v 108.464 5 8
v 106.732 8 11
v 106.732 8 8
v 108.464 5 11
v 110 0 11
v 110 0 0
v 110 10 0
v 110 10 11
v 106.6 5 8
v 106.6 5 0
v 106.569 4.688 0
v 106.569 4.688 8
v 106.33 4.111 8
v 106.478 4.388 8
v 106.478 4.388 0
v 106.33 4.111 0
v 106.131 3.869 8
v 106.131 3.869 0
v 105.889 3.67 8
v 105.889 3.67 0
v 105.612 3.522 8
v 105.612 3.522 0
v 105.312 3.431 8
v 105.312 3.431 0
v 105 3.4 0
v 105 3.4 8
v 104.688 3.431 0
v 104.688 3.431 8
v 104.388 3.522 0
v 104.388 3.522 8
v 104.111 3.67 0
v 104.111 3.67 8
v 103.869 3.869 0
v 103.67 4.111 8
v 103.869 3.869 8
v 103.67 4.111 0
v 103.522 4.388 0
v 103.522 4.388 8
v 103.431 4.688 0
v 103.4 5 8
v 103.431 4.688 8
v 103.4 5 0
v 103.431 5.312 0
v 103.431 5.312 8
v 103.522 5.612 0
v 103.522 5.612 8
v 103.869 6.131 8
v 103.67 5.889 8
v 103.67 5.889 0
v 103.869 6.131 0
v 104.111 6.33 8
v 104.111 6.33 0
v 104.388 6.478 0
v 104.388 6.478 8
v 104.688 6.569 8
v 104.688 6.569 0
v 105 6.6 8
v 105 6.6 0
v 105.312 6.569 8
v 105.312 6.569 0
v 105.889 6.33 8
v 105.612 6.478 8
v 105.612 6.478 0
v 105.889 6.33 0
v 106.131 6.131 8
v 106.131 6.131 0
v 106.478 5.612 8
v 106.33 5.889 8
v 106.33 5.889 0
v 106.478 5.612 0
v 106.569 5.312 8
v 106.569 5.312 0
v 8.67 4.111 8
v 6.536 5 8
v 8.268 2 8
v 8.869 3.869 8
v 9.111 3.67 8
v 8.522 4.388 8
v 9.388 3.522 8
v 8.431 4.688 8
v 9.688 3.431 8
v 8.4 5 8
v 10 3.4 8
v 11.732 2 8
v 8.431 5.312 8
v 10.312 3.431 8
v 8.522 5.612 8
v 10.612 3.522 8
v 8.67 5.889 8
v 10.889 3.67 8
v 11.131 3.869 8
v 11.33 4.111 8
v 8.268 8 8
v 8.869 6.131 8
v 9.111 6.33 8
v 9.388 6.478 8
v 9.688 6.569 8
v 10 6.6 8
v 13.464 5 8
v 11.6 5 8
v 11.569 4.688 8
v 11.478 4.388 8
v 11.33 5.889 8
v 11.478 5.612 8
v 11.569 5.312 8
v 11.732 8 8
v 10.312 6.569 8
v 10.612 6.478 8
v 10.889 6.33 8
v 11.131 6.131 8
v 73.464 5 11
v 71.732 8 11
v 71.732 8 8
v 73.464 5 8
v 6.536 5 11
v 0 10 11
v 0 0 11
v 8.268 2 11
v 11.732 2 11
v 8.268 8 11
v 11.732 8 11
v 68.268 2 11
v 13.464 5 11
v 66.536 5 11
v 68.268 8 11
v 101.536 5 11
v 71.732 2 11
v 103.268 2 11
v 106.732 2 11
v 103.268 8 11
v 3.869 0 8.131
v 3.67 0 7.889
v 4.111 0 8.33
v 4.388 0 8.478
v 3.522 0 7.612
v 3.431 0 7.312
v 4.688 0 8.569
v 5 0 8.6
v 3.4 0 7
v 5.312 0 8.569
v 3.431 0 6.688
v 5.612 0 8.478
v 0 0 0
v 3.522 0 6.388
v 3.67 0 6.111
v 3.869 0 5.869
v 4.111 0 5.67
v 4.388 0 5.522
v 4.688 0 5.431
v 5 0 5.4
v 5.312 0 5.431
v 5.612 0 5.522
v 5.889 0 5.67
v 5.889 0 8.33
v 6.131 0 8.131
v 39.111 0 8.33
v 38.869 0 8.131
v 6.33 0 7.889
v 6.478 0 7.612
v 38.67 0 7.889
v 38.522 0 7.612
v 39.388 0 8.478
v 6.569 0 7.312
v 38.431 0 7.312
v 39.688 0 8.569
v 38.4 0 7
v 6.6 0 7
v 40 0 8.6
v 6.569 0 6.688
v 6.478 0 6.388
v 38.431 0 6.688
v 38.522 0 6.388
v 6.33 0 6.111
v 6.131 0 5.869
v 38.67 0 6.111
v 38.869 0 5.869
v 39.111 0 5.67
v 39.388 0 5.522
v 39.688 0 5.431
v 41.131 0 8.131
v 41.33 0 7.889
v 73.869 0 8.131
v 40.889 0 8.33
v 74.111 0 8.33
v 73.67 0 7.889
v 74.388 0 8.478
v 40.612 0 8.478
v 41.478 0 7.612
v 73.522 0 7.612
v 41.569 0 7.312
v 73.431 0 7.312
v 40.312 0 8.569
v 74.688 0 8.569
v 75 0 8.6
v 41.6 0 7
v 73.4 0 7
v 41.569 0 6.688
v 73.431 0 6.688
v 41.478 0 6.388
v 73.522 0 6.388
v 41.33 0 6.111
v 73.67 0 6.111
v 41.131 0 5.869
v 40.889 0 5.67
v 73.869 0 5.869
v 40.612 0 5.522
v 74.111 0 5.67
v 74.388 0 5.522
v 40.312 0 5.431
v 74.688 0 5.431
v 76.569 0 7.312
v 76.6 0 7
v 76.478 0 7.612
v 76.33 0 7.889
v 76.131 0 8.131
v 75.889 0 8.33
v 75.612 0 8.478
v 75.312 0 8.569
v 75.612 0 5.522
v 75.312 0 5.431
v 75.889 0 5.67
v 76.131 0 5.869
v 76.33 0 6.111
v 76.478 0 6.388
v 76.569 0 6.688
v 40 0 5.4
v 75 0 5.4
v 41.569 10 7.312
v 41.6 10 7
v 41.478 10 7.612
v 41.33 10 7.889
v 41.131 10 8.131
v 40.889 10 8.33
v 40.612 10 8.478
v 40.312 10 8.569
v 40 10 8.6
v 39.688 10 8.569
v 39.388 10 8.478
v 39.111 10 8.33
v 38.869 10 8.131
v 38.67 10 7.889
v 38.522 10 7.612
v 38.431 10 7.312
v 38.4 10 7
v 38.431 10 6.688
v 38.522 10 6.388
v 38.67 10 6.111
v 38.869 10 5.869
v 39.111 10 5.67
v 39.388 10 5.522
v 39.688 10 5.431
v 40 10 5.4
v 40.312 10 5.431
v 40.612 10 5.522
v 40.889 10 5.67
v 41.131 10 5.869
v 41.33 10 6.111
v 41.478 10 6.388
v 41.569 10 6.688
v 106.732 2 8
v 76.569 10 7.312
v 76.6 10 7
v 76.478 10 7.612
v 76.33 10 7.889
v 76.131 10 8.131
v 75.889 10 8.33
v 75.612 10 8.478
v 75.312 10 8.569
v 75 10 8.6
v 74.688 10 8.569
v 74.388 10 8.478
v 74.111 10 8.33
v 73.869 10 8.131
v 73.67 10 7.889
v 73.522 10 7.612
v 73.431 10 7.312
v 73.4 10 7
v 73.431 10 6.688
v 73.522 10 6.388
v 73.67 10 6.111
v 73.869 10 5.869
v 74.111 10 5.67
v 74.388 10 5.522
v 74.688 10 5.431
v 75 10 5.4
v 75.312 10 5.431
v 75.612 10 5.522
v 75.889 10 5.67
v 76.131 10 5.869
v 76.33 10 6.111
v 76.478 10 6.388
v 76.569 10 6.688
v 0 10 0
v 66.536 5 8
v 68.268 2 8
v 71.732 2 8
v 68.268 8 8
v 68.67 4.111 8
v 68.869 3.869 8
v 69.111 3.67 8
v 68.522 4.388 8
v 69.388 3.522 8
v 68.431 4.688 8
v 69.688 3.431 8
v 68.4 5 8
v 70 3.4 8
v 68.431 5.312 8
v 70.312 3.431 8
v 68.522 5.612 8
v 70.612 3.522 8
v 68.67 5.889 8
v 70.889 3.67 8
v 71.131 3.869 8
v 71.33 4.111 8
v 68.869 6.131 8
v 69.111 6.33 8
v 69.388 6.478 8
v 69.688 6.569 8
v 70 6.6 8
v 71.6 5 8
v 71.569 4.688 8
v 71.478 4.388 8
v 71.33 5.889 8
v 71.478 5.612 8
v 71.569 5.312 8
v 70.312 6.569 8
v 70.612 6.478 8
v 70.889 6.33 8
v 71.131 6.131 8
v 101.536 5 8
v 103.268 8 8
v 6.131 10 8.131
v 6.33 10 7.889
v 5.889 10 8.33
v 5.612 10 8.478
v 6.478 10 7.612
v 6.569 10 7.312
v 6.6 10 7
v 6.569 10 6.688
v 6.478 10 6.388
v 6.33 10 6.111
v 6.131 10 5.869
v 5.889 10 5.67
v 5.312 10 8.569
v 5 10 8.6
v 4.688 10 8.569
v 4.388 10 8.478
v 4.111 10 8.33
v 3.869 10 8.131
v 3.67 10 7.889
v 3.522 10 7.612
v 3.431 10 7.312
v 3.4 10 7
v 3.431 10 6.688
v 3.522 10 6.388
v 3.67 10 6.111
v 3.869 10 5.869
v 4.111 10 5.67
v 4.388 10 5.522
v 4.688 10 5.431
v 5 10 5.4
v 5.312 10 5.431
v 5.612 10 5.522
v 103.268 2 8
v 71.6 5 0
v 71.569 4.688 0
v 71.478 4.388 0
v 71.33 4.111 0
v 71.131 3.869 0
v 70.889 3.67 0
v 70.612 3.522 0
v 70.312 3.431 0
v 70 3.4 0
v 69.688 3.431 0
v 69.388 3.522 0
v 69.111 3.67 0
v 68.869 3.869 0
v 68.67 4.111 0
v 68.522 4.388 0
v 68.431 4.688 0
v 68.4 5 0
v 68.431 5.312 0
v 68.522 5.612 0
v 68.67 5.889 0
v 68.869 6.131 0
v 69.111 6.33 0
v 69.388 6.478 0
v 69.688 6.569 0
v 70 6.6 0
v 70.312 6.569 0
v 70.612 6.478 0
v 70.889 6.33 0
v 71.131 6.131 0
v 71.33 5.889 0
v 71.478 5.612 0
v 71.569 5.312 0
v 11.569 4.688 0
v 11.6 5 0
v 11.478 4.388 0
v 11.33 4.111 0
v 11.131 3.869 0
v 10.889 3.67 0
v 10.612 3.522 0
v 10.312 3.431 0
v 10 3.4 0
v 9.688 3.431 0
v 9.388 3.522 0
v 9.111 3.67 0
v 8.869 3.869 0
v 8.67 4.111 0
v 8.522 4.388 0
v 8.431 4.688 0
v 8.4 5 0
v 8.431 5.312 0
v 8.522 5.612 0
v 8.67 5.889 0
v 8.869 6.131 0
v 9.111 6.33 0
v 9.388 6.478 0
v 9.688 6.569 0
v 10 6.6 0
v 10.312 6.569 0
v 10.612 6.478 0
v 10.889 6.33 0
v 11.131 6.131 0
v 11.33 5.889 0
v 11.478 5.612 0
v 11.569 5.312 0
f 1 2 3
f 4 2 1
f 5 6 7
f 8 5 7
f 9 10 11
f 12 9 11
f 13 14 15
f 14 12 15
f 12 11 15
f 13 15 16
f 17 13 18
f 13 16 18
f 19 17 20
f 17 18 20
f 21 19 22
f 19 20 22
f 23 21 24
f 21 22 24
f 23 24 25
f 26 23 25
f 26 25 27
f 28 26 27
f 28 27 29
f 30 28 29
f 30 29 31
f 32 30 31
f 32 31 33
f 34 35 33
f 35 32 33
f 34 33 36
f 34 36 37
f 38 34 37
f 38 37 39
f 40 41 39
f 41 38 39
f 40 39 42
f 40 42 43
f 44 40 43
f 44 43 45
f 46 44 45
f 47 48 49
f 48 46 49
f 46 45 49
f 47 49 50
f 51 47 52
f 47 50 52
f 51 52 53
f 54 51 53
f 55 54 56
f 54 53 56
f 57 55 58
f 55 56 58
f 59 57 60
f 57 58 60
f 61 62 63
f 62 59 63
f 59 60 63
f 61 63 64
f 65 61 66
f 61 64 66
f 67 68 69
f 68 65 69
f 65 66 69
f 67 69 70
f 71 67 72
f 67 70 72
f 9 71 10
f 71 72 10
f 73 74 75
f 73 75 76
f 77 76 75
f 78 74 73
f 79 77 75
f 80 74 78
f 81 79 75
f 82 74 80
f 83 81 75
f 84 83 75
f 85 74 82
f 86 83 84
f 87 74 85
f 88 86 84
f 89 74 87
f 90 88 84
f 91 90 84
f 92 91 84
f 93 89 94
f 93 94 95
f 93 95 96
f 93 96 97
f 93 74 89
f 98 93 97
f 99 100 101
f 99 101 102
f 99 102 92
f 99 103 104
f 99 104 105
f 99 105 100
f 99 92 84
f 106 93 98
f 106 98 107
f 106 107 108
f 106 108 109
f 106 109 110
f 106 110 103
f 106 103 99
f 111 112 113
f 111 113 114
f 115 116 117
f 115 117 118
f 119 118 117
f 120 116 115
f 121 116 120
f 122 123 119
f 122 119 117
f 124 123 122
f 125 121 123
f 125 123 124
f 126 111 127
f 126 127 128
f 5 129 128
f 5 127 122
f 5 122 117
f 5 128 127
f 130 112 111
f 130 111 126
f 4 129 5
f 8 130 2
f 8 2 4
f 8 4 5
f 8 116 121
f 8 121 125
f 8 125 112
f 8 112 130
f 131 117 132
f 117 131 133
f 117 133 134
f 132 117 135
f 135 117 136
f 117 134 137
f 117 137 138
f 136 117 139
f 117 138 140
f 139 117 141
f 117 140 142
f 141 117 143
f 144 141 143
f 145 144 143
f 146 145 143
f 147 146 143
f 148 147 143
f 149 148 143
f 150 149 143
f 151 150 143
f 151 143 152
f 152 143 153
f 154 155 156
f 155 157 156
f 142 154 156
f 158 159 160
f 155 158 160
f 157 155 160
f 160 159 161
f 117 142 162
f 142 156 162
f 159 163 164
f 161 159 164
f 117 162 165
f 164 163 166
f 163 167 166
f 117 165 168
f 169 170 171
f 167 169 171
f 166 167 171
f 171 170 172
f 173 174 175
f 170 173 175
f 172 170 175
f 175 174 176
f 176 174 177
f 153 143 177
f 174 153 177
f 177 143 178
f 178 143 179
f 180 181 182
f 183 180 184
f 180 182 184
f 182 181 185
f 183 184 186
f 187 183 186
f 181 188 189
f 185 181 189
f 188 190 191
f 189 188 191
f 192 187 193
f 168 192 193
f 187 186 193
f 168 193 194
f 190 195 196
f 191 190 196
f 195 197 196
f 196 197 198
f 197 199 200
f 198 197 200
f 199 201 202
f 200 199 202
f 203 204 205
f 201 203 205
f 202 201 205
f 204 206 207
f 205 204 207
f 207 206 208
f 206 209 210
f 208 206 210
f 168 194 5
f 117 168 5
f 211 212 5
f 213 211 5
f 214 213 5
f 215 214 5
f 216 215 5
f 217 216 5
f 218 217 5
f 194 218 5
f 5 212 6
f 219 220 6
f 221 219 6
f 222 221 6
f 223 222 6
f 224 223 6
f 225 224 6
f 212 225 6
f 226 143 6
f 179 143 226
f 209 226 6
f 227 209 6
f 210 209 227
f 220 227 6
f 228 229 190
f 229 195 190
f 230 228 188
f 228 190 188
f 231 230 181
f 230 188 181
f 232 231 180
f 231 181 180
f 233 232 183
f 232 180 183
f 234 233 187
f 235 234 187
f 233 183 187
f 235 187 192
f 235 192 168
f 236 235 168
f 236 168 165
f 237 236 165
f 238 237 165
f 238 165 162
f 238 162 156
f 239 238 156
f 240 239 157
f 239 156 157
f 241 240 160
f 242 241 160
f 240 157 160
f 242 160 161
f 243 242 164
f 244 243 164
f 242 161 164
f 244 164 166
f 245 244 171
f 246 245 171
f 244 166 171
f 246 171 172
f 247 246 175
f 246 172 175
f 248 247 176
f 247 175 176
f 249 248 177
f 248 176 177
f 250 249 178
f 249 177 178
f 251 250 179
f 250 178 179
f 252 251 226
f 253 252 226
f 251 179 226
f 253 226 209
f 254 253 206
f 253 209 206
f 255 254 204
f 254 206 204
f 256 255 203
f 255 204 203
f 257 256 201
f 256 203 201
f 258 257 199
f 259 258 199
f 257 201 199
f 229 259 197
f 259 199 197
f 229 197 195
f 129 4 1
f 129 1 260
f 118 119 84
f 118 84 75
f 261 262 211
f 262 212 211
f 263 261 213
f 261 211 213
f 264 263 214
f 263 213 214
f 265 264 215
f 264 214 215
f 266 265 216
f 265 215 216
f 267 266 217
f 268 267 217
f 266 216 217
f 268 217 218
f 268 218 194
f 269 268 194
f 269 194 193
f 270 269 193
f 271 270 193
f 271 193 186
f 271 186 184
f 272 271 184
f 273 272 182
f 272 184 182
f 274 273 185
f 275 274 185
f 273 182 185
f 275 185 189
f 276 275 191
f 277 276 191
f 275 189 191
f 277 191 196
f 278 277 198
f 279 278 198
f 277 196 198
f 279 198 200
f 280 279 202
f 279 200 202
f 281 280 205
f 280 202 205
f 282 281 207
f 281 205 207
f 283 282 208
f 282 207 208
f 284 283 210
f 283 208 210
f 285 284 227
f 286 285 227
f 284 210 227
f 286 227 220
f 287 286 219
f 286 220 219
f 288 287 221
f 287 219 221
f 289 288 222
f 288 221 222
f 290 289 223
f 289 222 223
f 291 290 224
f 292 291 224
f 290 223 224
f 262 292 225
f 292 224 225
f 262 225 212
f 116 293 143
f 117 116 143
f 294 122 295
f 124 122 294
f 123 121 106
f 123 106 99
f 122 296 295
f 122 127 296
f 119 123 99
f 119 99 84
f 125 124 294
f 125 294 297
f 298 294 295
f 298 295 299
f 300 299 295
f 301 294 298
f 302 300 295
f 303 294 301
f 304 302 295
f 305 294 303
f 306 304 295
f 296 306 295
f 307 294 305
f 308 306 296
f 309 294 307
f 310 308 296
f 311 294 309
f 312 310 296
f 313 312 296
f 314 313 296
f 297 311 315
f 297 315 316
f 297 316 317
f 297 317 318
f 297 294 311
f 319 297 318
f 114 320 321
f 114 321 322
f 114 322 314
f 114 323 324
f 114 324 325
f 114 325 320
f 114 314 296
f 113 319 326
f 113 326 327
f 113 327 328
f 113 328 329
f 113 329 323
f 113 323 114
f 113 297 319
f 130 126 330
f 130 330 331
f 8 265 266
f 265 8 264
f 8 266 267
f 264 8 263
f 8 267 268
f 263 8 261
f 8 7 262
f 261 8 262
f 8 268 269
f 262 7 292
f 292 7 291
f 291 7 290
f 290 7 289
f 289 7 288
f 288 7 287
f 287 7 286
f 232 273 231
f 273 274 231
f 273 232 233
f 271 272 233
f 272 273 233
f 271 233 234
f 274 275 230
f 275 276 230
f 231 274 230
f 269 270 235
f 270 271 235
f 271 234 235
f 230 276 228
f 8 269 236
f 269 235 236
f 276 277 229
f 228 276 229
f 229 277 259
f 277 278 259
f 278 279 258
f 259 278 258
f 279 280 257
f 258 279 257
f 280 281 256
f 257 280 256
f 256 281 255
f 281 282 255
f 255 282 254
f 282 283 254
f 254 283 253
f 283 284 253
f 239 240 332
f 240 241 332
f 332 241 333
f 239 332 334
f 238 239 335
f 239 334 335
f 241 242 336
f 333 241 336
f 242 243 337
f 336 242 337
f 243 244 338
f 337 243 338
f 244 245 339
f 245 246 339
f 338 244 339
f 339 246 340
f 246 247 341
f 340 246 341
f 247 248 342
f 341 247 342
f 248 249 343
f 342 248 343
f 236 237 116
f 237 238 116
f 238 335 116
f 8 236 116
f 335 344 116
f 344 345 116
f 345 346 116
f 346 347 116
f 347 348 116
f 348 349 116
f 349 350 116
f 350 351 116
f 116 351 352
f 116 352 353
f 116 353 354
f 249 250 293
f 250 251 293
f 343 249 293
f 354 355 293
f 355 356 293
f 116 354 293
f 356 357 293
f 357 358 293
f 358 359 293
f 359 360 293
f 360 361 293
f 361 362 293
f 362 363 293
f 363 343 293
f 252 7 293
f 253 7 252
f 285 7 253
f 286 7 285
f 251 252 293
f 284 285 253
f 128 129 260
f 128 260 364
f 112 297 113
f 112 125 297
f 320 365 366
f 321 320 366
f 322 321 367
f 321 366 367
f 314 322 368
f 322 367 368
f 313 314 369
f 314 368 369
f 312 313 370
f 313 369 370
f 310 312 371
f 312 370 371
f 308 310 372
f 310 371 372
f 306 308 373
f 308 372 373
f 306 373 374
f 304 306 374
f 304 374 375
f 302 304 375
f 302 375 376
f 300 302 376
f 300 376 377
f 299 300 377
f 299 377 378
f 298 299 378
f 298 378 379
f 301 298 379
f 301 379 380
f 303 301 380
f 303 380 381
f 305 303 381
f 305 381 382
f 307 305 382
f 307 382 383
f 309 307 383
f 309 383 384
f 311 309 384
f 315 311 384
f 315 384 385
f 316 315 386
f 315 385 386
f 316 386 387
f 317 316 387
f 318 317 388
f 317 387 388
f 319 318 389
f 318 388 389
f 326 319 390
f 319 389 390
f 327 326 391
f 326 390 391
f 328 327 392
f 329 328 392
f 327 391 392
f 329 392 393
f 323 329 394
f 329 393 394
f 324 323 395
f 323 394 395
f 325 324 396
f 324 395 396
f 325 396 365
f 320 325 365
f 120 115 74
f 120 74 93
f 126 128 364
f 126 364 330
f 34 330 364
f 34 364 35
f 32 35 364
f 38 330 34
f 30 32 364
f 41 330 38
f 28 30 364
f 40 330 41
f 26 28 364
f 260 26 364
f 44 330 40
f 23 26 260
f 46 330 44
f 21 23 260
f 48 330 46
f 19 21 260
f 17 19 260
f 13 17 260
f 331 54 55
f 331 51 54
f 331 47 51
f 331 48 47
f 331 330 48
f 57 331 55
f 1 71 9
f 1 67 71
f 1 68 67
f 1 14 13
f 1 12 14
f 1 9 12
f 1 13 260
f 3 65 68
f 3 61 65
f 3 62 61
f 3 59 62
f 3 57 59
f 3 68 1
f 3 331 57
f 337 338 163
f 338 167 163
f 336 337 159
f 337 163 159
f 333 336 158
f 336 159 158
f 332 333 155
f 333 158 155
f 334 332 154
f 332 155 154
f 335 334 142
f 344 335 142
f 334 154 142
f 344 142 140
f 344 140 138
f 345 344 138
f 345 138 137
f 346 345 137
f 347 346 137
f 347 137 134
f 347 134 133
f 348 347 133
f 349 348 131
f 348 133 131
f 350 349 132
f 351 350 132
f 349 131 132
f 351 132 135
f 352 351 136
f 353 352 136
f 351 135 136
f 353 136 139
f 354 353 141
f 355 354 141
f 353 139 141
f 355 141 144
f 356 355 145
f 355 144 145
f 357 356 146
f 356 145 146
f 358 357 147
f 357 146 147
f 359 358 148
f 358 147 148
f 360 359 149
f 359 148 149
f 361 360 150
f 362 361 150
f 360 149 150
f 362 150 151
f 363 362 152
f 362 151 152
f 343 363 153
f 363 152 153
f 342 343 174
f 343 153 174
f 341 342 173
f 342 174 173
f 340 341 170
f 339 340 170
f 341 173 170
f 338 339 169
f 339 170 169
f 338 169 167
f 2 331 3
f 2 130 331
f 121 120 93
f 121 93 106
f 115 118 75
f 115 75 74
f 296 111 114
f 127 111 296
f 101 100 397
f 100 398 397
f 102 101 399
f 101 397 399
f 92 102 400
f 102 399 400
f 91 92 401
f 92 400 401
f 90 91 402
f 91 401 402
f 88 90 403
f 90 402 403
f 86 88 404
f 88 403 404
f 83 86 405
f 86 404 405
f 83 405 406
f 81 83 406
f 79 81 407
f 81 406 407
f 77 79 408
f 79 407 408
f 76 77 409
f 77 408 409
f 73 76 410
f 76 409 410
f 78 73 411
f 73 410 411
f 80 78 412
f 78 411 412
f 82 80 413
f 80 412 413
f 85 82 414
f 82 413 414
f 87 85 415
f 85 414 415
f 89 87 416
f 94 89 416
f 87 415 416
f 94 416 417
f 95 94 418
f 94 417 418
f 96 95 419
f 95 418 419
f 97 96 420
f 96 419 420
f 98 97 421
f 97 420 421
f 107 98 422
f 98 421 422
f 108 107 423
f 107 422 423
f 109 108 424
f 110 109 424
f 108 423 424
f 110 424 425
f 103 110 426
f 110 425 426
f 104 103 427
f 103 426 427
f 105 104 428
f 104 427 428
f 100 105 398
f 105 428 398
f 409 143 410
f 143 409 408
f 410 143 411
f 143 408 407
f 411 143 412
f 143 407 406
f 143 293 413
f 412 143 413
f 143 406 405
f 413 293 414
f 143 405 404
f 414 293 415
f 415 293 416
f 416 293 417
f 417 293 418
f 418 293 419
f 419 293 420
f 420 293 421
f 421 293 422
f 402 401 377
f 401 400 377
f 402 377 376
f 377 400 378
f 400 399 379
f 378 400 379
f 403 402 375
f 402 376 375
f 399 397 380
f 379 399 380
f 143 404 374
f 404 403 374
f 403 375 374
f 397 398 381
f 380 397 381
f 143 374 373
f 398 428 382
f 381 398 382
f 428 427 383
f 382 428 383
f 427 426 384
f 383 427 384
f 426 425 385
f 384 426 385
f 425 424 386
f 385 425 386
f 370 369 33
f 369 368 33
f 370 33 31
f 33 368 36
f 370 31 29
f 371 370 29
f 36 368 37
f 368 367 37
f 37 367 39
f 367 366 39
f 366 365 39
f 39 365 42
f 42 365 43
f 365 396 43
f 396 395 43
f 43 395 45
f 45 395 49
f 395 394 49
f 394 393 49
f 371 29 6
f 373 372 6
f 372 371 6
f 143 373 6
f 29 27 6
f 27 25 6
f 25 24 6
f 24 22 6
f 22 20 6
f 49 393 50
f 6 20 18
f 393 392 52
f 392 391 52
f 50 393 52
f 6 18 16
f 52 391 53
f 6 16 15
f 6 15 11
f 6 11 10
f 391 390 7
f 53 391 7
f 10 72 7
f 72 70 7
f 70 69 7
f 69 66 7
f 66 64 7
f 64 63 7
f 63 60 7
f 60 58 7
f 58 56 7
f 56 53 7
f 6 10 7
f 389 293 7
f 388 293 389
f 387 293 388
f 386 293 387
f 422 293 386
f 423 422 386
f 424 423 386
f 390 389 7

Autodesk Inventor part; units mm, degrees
ref_plane "YZ Plane" through (0, 0, 0) normal (1, 0, 0) x (0, 1, 0)
ref_plane "XZ Plane" through (0, 0, 0) normal (0, 1, 0) x (-1, 0, 0)
ref_plane "XY Plane" through (0, 0, 0) normal (0, 0, 1) x (1, 0, 0)
sketch "Sketch1" plane through (0, 0, 0) normal (0, 0, 1) x (1, 0, 0)
  line L0 (0, 0) -> (110, 0)
  line L1 (110, 0) -> (110, 10)
  line L2 (110, 10) -> (0, 10)
  line L3 (0, 10) -> (0, 0)
  circle A0 centre (10, 5) radius 1.6
  circle A1 centre (70, 5) radius 1.6
  circle A2 centre (105, 5) radius 1.6
  dimension "d0" = 110
  dimension "d1" = 10
  dimension "d2" = 90
  dimension "d3" = 110
  dimension "d4" = 3.2
  dimension "d6" = 3.2
  dimension "d7" = 3.2
  dimension "d8" = 60
  dimension "d9" = 35
extrude "Extrusion1" add sketch "Sketch1" along normal blind 11
sketch "Sketch2" plane through (0, 0, 0) normal (0, -1, 0) x (1, 0, 0)
  line L0 (0, 0) -> (0, 11) projected
  line L1 (110, 0) -> (110, 11) projected
  line L2 (0, 0) -> (110, 0) projected
  circle A0 centre (5, 7) radius 1.6
  circle A1 centre (75, 7) radius 1.6
  circle A2 centre (40, 7) radius 1.6
  dimension "d13" = 3.2
  dimension "d14" = 5
  dimension "d15" = 3.2
  dimension "d16" = 70
  dimension "d17" = 3.2
  dimension "d18" = 35
extrude "Extrusion2" cut sketch "Sketch2" against normal blind 10
sketch "Sketch3" plane through (0, 0, 11) normal (0, 0, 1) x (1, 0, 0)
  point P0 (0, 0)
sketch "Sketch4" plane through (0, 0, 11) normal (0, 0, 1) x (1, 0, 0)
  line L0 (13.4641, 5) -> (11.7321, 2)
  line L1 (11.7321, 2) -> (8.2679, 2)
  line L2 (8.2679, 2) -> (6.5359, 5)
  line L3 (6.5359, 5) -> (8.2679, 8)
  line L4 (8.2679, 8) -> (11.7321, 8)
  line L5 (11.7321, 8) -> (13.4641, 5)
  line L6 (73.4641, 5) -> (71.7321, 2)
  line L7 (71.7321, 2) -> (68.2679, 2)
  line L8 (68.2679, 2) -> (66.5359, 5)
  line L9 (66.5359, 5) -> (68.2679, 8)
  line L10 (68.2679, 8) -> (71.7321, 8)
  line L11 (71.7321, 8) -> (73.4641, 5)
  circle A0 centre (105, 5) radius 1.6 projected
  line L12 (108.4641, 5) -> (106.7321, 2)
  line L13 (106.7321, 2) -> (103.2679, 2)
  line L14 (103.2679, 2) -> (101.5359, 5)
  line L15 (101.5359, 5) -> (103.2679, 8)
  line L16 (103.2679, 8) -> (106.7321, 8)
  line L17 (106.7321, 8) -> (108.4641, 5)
  point P0 (0, 0)
  point P1 (10, 5)
  point P2 (70, 5)
  dimension "d21" = 6
  dimension "d22" = 6
  dimension "d23" = 6
extrude "Extrusion3" cut sketch "Sketch4" against normal blind 3
properties part number "support"
